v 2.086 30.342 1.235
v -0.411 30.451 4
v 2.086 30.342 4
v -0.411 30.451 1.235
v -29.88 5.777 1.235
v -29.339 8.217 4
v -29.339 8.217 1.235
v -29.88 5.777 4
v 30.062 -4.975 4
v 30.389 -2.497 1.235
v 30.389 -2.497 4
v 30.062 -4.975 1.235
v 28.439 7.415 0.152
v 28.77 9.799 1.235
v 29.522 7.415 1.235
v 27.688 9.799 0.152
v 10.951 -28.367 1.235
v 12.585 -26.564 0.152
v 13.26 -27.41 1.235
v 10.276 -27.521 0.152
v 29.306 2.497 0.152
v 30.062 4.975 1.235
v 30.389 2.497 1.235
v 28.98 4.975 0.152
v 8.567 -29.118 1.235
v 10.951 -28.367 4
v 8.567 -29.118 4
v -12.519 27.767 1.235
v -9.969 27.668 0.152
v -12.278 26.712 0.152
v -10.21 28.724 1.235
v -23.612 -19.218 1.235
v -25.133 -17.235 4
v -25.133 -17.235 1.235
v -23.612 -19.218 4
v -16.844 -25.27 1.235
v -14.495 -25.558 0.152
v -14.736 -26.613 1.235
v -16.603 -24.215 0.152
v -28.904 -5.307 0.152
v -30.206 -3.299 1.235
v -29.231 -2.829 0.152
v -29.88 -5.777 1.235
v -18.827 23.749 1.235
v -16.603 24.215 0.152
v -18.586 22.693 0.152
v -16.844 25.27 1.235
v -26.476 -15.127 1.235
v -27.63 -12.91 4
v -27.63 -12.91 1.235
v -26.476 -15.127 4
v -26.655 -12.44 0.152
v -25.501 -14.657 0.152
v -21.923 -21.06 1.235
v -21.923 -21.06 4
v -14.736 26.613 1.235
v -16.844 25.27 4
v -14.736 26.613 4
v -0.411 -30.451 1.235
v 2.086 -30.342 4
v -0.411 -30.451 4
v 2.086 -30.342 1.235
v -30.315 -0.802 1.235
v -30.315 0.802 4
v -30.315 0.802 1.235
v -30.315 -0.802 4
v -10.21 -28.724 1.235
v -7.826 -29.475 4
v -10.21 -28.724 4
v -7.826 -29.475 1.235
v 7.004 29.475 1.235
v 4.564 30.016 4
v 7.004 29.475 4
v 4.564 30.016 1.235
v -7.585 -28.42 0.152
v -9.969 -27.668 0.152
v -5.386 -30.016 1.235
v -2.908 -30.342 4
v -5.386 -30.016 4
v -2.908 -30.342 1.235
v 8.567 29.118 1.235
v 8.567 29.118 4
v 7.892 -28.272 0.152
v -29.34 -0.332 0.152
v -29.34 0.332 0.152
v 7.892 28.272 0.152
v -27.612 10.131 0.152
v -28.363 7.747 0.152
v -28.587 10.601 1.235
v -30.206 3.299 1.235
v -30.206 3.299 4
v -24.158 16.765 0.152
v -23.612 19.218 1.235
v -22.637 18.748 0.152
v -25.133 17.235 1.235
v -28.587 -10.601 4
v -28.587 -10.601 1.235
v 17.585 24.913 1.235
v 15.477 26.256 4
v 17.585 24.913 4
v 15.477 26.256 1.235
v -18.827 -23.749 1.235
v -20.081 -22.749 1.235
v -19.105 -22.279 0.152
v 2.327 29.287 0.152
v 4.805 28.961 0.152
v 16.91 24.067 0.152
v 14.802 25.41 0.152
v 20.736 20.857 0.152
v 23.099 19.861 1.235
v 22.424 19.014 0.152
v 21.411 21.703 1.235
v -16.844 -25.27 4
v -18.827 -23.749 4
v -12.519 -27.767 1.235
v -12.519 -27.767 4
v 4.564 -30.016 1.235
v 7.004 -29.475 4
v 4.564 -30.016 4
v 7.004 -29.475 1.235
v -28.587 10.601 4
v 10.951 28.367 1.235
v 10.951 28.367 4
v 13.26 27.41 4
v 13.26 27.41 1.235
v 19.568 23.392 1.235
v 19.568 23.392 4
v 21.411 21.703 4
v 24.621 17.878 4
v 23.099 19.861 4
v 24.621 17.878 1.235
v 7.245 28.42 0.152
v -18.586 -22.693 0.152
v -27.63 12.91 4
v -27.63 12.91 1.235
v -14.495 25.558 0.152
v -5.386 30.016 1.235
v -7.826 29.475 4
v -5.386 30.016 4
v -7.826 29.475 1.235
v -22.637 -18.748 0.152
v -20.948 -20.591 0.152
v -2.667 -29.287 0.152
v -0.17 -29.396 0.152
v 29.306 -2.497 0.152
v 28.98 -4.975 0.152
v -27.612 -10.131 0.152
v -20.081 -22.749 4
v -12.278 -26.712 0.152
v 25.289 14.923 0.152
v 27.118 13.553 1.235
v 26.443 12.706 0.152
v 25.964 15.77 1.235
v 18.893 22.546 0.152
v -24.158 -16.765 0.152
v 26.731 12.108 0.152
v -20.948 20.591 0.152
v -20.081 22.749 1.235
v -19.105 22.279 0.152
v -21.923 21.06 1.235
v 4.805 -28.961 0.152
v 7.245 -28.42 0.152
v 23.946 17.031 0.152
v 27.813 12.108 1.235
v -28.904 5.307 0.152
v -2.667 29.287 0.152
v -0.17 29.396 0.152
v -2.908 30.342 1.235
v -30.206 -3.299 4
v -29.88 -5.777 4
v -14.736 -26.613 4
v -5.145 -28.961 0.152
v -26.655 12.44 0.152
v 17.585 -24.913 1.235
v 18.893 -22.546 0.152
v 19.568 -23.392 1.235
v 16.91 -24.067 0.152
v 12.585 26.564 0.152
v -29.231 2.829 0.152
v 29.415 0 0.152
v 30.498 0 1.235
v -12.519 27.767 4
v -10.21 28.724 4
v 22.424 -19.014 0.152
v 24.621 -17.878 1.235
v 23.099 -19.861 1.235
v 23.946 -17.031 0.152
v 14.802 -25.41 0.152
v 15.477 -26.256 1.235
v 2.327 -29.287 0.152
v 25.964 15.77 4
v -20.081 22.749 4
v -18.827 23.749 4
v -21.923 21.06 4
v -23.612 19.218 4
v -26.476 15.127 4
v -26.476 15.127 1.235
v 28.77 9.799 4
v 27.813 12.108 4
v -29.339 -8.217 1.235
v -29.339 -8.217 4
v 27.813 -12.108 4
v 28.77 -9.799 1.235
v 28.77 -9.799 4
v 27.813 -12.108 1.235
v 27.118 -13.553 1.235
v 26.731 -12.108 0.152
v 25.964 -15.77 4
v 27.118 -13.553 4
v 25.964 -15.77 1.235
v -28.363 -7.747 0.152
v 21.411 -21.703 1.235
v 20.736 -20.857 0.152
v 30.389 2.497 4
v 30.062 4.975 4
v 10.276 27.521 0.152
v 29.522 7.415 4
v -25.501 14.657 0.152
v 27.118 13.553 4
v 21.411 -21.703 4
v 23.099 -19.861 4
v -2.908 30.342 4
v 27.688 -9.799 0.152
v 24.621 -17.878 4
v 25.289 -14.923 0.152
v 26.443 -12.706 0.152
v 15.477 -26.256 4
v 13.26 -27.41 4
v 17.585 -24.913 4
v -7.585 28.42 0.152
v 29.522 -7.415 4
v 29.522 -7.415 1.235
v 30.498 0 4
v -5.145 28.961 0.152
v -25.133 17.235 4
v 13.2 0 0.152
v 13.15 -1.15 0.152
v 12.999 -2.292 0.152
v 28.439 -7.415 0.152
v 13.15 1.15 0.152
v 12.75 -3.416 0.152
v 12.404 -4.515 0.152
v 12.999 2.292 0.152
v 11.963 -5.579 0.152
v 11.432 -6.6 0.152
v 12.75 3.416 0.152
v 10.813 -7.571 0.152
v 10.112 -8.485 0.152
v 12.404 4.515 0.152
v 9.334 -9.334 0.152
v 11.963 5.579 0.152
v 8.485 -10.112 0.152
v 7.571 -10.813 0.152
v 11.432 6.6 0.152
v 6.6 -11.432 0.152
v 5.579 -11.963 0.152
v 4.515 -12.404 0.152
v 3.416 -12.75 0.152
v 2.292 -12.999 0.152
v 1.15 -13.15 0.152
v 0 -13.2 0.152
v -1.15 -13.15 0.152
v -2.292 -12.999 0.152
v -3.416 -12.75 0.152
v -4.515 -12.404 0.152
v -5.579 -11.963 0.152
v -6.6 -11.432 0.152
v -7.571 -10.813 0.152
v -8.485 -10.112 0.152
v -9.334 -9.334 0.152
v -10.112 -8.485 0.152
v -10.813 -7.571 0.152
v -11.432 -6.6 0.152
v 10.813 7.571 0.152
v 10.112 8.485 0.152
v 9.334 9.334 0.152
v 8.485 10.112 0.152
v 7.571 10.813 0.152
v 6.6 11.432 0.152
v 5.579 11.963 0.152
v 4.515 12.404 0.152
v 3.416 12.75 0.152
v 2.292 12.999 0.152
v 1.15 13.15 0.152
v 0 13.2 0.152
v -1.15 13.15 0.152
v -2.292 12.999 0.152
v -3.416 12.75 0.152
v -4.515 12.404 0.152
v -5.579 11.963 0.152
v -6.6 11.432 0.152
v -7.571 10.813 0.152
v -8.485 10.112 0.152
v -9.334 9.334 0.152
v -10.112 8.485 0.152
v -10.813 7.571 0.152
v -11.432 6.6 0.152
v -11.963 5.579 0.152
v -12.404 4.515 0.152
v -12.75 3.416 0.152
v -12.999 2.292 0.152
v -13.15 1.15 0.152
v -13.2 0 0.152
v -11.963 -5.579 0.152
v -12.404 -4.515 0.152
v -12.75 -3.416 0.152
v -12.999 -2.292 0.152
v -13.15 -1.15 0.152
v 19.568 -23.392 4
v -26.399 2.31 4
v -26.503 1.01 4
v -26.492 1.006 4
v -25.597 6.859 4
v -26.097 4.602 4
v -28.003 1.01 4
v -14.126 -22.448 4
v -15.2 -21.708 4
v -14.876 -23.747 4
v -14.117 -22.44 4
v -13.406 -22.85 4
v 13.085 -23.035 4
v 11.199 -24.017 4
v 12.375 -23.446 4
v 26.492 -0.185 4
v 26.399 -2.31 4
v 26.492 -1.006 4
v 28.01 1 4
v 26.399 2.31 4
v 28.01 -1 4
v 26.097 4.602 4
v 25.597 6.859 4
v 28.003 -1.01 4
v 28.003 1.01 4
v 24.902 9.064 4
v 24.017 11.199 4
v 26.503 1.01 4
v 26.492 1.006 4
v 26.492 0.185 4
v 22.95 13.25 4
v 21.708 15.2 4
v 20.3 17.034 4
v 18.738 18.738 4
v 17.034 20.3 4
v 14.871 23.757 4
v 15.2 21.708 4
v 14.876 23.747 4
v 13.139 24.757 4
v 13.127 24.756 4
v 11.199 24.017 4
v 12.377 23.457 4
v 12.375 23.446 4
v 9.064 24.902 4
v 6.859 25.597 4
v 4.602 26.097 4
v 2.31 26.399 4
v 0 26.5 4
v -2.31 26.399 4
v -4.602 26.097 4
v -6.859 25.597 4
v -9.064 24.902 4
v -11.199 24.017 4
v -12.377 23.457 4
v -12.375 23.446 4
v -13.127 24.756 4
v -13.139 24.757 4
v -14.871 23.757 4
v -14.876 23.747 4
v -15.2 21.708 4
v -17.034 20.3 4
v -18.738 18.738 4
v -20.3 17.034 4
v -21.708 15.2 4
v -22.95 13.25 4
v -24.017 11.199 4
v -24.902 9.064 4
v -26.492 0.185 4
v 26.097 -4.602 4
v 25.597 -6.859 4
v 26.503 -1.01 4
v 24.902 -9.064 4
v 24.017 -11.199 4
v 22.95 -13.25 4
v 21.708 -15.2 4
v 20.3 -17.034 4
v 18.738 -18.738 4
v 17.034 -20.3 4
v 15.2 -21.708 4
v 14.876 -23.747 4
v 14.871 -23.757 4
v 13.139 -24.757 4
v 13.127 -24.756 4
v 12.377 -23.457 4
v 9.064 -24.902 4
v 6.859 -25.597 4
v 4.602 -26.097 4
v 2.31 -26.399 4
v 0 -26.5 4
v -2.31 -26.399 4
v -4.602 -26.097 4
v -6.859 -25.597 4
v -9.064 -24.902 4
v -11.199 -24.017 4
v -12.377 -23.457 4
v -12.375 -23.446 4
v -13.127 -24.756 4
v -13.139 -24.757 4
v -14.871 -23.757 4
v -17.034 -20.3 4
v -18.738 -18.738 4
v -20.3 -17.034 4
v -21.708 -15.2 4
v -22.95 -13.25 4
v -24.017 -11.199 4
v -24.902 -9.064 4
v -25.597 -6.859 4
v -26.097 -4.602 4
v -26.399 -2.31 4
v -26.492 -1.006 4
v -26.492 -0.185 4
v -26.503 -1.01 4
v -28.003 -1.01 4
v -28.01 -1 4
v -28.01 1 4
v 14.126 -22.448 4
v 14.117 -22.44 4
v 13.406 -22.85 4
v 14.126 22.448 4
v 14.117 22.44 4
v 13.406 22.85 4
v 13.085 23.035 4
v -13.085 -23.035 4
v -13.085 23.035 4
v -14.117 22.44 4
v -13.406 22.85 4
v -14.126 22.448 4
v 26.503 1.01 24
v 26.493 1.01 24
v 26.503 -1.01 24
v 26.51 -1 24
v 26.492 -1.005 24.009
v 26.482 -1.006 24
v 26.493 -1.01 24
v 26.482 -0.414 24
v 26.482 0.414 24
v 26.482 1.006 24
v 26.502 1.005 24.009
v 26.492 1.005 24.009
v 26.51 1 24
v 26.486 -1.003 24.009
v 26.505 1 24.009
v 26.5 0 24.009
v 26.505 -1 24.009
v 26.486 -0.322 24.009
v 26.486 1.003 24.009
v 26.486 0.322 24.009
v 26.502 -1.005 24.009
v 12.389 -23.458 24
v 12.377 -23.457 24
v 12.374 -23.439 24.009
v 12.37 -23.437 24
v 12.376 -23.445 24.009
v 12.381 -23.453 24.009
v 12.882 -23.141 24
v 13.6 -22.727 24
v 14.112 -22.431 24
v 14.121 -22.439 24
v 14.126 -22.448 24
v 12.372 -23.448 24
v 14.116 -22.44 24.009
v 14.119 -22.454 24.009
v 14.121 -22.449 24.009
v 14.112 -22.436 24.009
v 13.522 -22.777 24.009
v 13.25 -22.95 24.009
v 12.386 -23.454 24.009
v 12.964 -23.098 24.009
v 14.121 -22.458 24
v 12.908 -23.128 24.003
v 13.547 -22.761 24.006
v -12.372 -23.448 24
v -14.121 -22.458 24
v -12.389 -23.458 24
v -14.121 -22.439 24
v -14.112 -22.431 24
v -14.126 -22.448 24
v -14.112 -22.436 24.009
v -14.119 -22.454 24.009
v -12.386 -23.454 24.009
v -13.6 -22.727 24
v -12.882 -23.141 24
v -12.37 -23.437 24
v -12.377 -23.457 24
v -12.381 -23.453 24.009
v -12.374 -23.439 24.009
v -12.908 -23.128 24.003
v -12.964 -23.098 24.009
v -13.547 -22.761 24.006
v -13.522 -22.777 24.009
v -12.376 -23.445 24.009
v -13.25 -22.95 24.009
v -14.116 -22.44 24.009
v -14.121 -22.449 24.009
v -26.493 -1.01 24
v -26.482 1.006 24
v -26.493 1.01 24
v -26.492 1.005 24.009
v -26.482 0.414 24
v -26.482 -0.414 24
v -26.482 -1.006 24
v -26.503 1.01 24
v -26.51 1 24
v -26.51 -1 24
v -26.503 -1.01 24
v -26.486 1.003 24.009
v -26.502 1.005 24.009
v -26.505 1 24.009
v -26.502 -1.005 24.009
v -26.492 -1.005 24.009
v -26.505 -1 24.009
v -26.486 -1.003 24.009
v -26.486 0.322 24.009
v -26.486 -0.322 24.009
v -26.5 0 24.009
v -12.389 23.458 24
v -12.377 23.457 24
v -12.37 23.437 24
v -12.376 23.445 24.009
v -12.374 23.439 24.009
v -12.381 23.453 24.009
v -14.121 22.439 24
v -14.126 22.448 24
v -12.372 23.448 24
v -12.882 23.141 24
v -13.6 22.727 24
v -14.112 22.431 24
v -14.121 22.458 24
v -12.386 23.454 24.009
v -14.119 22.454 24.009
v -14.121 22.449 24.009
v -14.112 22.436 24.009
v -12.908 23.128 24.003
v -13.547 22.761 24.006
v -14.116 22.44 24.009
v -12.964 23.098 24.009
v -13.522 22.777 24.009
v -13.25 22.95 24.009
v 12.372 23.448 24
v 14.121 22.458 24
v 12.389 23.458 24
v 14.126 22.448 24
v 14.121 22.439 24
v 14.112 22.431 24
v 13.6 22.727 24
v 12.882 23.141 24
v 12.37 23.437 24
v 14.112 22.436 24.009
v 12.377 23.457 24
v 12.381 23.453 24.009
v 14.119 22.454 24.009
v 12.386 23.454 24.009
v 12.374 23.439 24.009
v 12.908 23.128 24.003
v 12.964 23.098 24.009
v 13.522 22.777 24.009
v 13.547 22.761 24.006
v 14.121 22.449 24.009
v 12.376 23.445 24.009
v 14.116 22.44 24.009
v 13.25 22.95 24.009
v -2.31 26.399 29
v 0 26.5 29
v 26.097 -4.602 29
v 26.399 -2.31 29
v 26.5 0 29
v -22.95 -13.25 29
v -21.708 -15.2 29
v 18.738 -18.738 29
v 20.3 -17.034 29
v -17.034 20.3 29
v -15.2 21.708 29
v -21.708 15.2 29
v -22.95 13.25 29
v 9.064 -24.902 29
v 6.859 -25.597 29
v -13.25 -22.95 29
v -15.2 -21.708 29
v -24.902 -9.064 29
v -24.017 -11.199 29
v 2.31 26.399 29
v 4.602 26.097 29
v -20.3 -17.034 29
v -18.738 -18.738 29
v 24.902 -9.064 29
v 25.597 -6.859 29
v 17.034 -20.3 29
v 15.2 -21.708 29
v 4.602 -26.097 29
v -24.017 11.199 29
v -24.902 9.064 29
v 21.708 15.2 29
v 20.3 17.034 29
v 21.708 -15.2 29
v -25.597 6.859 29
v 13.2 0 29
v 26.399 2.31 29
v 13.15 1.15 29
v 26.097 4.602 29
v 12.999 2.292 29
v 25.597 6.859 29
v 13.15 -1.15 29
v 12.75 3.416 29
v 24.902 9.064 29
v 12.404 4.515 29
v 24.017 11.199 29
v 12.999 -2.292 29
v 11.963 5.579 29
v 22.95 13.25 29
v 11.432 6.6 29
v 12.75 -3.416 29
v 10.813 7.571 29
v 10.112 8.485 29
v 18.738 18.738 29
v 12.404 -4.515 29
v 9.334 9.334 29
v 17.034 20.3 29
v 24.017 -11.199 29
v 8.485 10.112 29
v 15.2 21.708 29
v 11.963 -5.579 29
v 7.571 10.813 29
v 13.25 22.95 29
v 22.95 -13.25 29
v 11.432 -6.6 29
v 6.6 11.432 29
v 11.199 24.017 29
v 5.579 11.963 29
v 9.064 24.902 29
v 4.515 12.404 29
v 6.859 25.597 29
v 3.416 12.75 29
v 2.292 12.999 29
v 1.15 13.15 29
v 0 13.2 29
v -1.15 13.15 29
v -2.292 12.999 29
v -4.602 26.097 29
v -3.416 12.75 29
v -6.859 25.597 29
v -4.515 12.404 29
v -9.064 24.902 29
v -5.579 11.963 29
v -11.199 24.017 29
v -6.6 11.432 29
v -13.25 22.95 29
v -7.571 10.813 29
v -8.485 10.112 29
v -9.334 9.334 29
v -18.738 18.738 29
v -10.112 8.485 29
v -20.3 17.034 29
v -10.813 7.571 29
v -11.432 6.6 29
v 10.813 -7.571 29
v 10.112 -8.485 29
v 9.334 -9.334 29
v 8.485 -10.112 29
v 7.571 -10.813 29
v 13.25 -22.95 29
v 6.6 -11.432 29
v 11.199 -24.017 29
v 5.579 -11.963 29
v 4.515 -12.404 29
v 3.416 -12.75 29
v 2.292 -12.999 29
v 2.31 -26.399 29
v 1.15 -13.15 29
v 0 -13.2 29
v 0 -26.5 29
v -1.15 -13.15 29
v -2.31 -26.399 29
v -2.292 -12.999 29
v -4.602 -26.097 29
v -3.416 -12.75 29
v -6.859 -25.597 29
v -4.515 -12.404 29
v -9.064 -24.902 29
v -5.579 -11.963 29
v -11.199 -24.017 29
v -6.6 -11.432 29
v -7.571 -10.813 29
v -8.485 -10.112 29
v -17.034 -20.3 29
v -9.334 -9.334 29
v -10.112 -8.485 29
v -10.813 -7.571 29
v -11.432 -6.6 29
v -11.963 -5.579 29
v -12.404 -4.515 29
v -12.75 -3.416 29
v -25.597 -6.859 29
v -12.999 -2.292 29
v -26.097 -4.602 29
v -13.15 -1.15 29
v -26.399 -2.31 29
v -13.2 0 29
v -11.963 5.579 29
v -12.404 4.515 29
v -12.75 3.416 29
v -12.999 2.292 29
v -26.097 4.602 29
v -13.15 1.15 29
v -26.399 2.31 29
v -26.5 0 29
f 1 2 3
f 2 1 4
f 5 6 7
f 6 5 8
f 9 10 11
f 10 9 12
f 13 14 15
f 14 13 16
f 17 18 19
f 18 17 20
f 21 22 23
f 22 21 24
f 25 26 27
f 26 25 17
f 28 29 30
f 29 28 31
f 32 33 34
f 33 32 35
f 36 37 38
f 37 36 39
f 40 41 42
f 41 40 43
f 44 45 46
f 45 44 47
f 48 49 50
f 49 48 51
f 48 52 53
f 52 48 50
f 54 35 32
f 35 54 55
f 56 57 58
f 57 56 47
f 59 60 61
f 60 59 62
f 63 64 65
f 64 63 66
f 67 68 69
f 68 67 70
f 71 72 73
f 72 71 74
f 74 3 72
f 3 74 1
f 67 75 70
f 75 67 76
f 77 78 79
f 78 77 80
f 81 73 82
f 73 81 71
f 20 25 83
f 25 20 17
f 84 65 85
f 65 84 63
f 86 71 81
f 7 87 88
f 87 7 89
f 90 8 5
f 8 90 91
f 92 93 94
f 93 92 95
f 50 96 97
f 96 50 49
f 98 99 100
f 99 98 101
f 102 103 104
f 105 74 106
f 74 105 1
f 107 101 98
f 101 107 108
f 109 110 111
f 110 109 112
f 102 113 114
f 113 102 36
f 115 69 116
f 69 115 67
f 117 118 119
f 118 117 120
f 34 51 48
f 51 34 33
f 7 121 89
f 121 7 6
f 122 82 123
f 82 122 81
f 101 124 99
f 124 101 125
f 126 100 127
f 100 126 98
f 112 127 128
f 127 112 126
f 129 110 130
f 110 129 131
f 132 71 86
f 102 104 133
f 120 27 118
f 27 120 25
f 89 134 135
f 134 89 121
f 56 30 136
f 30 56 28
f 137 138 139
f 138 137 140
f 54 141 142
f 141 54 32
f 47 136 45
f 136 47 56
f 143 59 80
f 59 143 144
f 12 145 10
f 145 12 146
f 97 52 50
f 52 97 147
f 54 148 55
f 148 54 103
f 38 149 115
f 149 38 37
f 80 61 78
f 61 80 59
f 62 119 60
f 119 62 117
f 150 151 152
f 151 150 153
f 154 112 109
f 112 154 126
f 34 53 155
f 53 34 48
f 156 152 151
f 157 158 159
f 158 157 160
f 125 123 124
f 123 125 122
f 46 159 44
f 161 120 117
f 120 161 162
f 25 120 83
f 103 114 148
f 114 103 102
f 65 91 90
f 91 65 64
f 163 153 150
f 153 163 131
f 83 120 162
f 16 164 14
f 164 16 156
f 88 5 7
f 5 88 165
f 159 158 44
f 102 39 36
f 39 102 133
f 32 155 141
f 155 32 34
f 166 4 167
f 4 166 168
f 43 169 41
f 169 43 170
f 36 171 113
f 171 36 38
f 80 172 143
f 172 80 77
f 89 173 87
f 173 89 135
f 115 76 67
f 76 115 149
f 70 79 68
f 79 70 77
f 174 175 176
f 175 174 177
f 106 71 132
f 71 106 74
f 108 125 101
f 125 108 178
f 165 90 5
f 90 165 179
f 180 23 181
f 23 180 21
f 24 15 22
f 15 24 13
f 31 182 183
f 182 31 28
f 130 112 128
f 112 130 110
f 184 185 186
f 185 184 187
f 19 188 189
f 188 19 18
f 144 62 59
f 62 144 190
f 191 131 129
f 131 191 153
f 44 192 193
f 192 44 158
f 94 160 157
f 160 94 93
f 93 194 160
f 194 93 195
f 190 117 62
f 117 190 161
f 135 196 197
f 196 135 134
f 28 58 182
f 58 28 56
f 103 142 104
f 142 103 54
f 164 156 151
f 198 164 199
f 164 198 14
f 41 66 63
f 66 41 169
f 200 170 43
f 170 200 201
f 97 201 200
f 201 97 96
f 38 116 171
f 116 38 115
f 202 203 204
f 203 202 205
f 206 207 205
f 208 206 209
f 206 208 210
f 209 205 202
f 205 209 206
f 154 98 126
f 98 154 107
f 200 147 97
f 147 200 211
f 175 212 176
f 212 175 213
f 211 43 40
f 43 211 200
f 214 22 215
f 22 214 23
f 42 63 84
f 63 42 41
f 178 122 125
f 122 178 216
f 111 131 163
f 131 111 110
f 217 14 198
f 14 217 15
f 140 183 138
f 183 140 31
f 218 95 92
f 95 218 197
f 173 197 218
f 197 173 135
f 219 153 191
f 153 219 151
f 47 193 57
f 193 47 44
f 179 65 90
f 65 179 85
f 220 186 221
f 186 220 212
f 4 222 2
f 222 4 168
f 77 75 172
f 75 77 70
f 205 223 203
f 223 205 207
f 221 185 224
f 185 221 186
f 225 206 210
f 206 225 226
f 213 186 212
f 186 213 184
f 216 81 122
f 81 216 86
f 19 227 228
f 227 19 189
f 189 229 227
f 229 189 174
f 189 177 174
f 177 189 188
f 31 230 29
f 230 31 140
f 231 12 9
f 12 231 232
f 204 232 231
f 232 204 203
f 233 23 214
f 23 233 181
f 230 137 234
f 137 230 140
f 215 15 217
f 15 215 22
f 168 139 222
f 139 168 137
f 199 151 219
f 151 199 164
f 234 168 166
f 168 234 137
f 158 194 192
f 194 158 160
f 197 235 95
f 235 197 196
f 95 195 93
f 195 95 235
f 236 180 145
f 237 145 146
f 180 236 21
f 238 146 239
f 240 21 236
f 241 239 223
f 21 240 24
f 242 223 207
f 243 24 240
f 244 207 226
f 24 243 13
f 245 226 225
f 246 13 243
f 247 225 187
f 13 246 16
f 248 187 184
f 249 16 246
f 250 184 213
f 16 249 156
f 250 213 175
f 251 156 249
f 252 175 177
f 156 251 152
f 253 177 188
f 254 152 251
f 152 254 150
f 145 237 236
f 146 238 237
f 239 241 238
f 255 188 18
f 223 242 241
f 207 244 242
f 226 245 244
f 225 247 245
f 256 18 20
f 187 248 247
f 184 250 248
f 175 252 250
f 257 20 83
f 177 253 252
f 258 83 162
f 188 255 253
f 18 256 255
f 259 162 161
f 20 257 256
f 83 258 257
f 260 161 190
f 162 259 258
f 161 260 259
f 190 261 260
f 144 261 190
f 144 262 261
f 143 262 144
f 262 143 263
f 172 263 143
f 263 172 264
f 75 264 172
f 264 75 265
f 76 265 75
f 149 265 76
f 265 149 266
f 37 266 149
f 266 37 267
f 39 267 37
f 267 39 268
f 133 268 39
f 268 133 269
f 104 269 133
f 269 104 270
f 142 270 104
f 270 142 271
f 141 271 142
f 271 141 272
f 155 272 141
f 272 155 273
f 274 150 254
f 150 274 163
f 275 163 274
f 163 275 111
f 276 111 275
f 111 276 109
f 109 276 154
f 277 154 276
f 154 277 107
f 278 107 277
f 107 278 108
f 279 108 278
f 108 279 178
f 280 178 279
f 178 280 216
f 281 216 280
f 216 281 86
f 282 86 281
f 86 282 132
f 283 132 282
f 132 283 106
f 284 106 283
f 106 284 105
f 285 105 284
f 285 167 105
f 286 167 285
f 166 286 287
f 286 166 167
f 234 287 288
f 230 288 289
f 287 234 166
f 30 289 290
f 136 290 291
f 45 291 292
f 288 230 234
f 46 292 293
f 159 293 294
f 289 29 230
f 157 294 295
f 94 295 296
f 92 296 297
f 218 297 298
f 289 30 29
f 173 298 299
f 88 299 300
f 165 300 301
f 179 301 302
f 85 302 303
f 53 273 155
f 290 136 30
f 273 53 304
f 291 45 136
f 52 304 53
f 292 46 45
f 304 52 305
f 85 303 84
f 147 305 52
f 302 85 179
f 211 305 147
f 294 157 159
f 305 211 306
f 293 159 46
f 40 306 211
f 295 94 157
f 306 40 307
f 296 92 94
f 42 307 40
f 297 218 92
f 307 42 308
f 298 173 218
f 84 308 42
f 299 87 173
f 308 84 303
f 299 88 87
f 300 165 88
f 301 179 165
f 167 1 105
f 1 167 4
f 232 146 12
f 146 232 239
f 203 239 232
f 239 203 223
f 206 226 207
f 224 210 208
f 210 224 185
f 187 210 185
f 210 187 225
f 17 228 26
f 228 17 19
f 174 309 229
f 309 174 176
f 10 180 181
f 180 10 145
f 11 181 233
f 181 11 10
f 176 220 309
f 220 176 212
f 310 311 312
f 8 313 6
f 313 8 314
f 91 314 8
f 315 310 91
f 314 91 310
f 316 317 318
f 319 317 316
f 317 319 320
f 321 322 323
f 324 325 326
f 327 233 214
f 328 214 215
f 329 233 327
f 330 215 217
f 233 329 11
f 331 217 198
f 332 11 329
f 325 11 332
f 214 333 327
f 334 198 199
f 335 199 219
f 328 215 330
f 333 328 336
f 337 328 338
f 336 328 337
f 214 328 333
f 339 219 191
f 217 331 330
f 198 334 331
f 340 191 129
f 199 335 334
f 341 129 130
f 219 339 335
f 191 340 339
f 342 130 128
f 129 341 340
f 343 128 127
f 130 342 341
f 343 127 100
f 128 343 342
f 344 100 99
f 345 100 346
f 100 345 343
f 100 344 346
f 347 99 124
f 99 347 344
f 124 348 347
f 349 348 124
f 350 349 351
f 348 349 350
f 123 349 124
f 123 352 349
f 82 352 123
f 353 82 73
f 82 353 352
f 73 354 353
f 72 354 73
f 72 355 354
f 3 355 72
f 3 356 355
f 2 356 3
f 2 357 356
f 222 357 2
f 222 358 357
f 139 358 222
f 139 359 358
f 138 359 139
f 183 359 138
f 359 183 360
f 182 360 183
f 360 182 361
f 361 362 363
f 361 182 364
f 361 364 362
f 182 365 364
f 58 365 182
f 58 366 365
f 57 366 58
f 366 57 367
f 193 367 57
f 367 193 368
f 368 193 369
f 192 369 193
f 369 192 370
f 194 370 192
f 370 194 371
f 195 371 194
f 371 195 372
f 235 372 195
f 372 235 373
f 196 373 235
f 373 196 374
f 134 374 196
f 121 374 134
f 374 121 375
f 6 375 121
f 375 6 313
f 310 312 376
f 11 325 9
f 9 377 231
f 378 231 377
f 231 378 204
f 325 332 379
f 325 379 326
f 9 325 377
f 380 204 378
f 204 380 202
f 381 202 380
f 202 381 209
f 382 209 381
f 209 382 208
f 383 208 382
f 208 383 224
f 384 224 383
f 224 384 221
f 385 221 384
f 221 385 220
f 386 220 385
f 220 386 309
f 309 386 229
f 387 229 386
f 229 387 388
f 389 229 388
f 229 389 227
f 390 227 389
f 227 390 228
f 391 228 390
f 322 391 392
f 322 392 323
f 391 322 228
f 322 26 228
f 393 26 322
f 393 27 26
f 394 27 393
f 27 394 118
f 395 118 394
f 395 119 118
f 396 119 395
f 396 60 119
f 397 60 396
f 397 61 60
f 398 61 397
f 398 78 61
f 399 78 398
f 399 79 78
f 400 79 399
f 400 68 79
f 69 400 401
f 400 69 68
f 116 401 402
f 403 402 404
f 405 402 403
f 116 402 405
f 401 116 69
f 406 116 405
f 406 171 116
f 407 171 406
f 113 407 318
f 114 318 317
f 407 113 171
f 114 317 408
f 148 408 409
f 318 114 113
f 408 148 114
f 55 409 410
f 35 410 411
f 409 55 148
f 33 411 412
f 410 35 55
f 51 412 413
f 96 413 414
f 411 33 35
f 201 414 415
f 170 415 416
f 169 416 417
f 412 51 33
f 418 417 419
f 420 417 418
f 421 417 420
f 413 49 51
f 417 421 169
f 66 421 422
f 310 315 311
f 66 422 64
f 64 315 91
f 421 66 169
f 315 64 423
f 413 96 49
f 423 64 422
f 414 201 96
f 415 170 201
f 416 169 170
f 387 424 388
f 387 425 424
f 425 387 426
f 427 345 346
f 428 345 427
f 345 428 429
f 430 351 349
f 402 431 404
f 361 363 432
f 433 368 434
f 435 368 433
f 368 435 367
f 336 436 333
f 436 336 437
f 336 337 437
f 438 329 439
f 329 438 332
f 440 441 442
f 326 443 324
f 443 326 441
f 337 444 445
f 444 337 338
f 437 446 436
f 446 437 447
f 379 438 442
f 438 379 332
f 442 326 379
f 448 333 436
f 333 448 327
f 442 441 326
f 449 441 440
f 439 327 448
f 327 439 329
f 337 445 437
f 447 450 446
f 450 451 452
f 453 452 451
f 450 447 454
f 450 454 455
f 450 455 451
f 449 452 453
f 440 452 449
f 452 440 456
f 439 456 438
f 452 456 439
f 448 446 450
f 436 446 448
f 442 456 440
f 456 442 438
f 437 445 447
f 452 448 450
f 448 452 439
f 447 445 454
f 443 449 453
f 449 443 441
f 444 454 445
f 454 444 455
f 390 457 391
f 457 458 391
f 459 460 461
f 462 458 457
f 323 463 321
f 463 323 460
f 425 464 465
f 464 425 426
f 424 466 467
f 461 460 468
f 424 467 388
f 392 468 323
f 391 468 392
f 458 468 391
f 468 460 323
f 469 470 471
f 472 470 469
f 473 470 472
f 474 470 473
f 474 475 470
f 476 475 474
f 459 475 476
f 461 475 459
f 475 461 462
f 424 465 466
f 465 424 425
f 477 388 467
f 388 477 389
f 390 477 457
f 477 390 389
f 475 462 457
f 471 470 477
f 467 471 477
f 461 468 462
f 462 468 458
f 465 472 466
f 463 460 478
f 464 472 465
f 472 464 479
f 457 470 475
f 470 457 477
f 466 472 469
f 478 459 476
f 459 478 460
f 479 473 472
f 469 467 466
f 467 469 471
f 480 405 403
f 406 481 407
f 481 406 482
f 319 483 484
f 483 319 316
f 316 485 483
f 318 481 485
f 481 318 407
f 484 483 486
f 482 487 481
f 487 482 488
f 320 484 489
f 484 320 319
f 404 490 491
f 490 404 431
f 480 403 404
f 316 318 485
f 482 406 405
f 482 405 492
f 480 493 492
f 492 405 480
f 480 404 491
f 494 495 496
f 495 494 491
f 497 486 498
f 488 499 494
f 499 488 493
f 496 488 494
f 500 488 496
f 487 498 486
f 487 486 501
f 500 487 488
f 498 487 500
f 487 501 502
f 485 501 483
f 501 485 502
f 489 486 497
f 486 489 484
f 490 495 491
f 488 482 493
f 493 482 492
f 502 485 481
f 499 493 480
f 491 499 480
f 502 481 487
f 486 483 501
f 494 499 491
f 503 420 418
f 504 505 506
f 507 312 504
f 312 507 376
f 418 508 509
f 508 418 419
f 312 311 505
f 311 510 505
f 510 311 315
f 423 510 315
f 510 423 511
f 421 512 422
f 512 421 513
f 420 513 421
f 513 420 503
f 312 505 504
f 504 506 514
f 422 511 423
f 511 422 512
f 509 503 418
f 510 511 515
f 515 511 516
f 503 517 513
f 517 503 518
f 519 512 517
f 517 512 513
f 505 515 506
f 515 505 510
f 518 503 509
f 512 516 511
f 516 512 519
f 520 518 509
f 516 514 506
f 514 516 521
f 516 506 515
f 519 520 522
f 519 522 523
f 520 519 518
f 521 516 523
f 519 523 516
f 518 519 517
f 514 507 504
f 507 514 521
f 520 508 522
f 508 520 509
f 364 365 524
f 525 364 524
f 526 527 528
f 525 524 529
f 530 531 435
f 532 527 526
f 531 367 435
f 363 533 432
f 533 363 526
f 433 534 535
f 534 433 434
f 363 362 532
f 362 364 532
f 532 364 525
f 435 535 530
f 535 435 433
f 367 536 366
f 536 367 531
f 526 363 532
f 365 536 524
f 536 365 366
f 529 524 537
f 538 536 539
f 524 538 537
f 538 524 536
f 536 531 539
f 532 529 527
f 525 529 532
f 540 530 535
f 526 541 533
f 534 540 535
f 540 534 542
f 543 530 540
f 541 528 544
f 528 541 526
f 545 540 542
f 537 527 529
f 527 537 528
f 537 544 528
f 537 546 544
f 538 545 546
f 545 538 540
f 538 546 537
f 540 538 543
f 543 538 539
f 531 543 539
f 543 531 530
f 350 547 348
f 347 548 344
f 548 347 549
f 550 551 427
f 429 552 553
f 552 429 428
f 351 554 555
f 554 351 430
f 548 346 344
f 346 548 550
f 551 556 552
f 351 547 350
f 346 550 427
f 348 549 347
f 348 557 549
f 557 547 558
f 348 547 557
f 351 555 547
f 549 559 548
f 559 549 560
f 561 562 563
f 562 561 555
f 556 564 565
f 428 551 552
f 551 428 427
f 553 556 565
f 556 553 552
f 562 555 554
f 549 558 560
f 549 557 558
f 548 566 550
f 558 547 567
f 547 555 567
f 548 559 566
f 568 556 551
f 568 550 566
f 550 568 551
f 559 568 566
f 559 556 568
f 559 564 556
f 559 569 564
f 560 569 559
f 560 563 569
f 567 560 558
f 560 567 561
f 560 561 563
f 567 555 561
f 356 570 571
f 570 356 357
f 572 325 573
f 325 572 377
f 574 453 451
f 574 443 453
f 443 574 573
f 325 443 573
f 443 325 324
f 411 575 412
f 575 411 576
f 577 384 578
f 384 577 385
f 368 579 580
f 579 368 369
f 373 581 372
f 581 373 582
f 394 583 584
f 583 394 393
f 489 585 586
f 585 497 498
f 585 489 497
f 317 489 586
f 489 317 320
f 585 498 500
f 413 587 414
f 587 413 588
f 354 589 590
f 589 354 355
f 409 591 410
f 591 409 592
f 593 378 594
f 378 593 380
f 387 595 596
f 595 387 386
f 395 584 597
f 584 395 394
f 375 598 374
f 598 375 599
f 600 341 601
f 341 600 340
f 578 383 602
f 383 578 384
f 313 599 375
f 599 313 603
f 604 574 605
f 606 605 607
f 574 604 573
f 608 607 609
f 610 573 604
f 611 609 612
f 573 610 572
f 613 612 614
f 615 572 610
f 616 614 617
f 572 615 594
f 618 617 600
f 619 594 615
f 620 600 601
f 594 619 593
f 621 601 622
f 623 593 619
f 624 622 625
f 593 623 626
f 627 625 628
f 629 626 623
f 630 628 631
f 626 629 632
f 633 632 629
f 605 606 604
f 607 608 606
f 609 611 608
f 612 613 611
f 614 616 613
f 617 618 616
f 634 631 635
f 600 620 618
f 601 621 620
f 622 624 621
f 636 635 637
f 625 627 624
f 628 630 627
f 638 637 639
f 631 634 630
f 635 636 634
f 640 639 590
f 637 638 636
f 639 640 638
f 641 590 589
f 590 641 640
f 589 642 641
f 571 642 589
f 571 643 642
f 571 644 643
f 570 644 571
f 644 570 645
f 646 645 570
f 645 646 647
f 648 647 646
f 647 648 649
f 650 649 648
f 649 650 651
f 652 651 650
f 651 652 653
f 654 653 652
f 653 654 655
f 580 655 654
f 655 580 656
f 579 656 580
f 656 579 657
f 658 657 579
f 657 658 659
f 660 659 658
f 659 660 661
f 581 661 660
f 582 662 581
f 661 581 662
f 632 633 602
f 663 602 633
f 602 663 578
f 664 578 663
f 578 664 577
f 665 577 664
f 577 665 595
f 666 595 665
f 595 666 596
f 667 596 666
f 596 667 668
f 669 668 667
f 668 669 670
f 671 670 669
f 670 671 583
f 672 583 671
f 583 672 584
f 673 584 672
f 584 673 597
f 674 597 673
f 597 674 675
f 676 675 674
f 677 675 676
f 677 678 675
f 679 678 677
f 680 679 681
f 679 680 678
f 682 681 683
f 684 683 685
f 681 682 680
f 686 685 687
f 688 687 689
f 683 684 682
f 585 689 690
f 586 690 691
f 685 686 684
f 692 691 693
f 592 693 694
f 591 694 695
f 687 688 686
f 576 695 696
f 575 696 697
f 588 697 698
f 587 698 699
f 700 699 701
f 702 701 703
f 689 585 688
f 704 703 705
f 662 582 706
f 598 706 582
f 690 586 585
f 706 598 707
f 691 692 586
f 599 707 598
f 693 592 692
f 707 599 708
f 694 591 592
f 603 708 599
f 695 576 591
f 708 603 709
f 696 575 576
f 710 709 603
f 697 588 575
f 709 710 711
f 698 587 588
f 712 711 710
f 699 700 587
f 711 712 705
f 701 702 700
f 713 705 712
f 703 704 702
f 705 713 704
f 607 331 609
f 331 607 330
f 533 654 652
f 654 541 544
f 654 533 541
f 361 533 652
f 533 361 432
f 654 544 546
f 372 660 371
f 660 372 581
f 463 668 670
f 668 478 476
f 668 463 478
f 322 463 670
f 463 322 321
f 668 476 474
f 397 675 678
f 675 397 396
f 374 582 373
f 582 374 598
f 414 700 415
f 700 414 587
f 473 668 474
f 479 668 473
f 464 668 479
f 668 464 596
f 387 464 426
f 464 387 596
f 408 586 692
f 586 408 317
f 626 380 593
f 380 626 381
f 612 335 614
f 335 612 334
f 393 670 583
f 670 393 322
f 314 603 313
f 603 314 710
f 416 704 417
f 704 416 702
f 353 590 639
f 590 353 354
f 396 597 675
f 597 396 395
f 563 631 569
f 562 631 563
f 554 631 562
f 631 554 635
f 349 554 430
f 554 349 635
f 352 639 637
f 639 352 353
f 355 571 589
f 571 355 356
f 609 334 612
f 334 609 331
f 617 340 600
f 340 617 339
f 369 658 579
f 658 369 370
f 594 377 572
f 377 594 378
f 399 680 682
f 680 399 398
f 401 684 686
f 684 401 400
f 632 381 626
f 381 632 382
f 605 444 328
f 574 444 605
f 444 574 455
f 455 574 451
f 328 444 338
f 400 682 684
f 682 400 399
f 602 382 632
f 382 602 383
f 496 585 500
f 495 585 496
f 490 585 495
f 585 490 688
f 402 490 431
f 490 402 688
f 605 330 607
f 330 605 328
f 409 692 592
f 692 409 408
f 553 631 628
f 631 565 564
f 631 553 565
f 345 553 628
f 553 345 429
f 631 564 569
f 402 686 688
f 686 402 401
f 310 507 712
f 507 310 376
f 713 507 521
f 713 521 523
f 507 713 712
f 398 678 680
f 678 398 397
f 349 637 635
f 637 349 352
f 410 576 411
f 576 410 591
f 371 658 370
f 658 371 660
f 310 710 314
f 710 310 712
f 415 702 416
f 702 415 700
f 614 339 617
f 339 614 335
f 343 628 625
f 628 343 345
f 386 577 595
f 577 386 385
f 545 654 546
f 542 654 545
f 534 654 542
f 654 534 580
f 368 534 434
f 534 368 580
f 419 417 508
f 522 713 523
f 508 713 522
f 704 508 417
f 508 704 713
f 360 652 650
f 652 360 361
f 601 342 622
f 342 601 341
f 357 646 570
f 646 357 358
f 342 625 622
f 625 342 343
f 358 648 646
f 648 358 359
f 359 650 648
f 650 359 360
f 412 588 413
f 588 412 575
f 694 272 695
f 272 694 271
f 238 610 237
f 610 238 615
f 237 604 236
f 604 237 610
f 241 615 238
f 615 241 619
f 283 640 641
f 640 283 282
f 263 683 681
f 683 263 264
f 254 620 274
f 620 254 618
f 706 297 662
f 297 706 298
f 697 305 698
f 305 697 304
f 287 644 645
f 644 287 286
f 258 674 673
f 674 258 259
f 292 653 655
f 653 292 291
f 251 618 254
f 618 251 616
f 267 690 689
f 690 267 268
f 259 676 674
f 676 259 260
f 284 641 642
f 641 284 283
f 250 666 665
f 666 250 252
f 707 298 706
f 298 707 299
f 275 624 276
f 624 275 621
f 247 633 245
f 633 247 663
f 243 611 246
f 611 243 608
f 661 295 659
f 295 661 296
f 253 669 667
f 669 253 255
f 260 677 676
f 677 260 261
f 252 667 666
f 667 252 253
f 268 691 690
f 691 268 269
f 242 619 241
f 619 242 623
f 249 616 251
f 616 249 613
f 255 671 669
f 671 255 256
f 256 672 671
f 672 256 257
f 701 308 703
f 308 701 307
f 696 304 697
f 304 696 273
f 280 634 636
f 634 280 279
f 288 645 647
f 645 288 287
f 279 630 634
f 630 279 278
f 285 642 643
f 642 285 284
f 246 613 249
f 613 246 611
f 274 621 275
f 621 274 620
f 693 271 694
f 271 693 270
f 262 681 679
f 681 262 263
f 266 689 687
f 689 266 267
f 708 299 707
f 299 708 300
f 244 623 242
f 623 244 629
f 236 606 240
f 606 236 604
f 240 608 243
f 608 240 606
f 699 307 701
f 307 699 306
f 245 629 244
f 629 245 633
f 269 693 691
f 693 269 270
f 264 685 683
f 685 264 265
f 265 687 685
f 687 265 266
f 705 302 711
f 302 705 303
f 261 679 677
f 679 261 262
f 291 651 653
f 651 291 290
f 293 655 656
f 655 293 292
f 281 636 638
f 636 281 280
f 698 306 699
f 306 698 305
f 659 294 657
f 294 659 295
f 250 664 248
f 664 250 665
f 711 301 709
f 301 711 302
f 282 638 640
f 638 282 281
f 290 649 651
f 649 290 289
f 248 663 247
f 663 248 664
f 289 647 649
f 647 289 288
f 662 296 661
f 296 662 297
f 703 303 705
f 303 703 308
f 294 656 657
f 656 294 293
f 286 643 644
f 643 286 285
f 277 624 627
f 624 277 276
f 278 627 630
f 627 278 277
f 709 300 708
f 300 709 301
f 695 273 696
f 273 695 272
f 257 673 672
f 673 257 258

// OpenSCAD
// Sunshade upper clip
//
// Copyright (C) 2019 Jeremy Bennett <www.jeremybennett.com>
// Contributor: Jeremy Bennett <jeremy.bennett@embecosm.com>
//
// SPDX-License-Identifier: CC-BY-SA-4.0

// A shim to fit a narrow sunshade pole in a larger holder

// The 3D printer is calibrated so that X-Y are around 2% too small, sizes are
// adjusted accordingly

MINK_R = 2.0;
RIM_H = 4.0;
INNER_H = 25.0;
RIB_H = 20.0;
RIB_W = 2.0;
RIB_D = 1.5;
OUTER_R = 61.3 / 2.0;           // Actual 60.0
INNER_R = 53.0 / 2.0;		// 2% is about enough for easy play each side
POLE_R = 26.4 / 2.0;		// Actual 25.3, plus 0.25 gap each side

// Very small value
EPS = 0.01;

// Very large value
INF = 1000.0;

module rim () {
     translate (v = [0, 0, INNER_H])
	  difference () {
	       minkowski () {
		    cylinder (r = OUTER_R - MINK_R, h = RIM_H - MINK_R,
			      center = false, $fn = 72);
	       sphere (r = MINK_R);
	       }
	       translate (v = [0, 0, -INF / 2])
		    cube (size = INF, center = true);
     }
}

module inner_cylinder () {
     translate (v = [0, 0, (INNER_H + EPS) / 2.0])
	  cylinder (r = INNER_R, h = INNER_H + EPS, center = true, $fn= 72);
}

module rib () {
     hull () {
	  translate (v = [INNER_R - EPS, - RIB_W / 2, INNER_H - RIB_H])
	       sphere (r = EPS);
	  translate (v = [INNER_R - EPS, RIB_W / 2, INNER_H - RIB_H])
	       sphere (r = EPS);
	  translate (v = [INNER_R, - RIB_W / 2, INNER_H - RIB_H])
	       sphere (r = EPS);
	  translate (v = [INNER_R, RIB_W / 2, INNER_H - RIB_H])
	       sphere (r = EPS);
	  translate (v = [INNER_R + RIB_D, - RIB_W / 2, INNER_H])
	       sphere (r = EPS);
	  translate (v = [INNER_R + RIB_D, RIB_W / 2, INNER_H])
	       sphere (r = EPS);
	  translate (v = [INNER_R, - RIB_W / 2, INNER_H])
	       sphere (r = EPS);
	  translate (v = [INNER_R, RIB_W / 2, INNER_H])
	       sphere (r = EPS);
     }
}

module rib_set () {
     union () {
	  rotate (a = [0, 0,   0])
	       rib ();
	  rotate (a = [0, 0,  60])
	       rib ();
	  rotate (a = [0, 0, 120])
	       rib ();
	  rotate (a = [0, 0, 180])
	       rib ();
	  rotate (a = [0, 0, 240])
	       rib ();
	  rotate (a = [0, 0, 300])
	       rib ();
     }
}

module upper_clip () {
     difference () {
	  union () {
	       rim();
	       inner_cylinder ();
	       rib_set ();
	  }
	  cylinder (r = POLE_R, h = INF, center = true, $fn= 72);
     }
}

// Have to print upside down
translate (v = [0, 0, RIM_H + INNER_H])
     rotate (a = [180, 0, 0])
	  upper_clip ();
